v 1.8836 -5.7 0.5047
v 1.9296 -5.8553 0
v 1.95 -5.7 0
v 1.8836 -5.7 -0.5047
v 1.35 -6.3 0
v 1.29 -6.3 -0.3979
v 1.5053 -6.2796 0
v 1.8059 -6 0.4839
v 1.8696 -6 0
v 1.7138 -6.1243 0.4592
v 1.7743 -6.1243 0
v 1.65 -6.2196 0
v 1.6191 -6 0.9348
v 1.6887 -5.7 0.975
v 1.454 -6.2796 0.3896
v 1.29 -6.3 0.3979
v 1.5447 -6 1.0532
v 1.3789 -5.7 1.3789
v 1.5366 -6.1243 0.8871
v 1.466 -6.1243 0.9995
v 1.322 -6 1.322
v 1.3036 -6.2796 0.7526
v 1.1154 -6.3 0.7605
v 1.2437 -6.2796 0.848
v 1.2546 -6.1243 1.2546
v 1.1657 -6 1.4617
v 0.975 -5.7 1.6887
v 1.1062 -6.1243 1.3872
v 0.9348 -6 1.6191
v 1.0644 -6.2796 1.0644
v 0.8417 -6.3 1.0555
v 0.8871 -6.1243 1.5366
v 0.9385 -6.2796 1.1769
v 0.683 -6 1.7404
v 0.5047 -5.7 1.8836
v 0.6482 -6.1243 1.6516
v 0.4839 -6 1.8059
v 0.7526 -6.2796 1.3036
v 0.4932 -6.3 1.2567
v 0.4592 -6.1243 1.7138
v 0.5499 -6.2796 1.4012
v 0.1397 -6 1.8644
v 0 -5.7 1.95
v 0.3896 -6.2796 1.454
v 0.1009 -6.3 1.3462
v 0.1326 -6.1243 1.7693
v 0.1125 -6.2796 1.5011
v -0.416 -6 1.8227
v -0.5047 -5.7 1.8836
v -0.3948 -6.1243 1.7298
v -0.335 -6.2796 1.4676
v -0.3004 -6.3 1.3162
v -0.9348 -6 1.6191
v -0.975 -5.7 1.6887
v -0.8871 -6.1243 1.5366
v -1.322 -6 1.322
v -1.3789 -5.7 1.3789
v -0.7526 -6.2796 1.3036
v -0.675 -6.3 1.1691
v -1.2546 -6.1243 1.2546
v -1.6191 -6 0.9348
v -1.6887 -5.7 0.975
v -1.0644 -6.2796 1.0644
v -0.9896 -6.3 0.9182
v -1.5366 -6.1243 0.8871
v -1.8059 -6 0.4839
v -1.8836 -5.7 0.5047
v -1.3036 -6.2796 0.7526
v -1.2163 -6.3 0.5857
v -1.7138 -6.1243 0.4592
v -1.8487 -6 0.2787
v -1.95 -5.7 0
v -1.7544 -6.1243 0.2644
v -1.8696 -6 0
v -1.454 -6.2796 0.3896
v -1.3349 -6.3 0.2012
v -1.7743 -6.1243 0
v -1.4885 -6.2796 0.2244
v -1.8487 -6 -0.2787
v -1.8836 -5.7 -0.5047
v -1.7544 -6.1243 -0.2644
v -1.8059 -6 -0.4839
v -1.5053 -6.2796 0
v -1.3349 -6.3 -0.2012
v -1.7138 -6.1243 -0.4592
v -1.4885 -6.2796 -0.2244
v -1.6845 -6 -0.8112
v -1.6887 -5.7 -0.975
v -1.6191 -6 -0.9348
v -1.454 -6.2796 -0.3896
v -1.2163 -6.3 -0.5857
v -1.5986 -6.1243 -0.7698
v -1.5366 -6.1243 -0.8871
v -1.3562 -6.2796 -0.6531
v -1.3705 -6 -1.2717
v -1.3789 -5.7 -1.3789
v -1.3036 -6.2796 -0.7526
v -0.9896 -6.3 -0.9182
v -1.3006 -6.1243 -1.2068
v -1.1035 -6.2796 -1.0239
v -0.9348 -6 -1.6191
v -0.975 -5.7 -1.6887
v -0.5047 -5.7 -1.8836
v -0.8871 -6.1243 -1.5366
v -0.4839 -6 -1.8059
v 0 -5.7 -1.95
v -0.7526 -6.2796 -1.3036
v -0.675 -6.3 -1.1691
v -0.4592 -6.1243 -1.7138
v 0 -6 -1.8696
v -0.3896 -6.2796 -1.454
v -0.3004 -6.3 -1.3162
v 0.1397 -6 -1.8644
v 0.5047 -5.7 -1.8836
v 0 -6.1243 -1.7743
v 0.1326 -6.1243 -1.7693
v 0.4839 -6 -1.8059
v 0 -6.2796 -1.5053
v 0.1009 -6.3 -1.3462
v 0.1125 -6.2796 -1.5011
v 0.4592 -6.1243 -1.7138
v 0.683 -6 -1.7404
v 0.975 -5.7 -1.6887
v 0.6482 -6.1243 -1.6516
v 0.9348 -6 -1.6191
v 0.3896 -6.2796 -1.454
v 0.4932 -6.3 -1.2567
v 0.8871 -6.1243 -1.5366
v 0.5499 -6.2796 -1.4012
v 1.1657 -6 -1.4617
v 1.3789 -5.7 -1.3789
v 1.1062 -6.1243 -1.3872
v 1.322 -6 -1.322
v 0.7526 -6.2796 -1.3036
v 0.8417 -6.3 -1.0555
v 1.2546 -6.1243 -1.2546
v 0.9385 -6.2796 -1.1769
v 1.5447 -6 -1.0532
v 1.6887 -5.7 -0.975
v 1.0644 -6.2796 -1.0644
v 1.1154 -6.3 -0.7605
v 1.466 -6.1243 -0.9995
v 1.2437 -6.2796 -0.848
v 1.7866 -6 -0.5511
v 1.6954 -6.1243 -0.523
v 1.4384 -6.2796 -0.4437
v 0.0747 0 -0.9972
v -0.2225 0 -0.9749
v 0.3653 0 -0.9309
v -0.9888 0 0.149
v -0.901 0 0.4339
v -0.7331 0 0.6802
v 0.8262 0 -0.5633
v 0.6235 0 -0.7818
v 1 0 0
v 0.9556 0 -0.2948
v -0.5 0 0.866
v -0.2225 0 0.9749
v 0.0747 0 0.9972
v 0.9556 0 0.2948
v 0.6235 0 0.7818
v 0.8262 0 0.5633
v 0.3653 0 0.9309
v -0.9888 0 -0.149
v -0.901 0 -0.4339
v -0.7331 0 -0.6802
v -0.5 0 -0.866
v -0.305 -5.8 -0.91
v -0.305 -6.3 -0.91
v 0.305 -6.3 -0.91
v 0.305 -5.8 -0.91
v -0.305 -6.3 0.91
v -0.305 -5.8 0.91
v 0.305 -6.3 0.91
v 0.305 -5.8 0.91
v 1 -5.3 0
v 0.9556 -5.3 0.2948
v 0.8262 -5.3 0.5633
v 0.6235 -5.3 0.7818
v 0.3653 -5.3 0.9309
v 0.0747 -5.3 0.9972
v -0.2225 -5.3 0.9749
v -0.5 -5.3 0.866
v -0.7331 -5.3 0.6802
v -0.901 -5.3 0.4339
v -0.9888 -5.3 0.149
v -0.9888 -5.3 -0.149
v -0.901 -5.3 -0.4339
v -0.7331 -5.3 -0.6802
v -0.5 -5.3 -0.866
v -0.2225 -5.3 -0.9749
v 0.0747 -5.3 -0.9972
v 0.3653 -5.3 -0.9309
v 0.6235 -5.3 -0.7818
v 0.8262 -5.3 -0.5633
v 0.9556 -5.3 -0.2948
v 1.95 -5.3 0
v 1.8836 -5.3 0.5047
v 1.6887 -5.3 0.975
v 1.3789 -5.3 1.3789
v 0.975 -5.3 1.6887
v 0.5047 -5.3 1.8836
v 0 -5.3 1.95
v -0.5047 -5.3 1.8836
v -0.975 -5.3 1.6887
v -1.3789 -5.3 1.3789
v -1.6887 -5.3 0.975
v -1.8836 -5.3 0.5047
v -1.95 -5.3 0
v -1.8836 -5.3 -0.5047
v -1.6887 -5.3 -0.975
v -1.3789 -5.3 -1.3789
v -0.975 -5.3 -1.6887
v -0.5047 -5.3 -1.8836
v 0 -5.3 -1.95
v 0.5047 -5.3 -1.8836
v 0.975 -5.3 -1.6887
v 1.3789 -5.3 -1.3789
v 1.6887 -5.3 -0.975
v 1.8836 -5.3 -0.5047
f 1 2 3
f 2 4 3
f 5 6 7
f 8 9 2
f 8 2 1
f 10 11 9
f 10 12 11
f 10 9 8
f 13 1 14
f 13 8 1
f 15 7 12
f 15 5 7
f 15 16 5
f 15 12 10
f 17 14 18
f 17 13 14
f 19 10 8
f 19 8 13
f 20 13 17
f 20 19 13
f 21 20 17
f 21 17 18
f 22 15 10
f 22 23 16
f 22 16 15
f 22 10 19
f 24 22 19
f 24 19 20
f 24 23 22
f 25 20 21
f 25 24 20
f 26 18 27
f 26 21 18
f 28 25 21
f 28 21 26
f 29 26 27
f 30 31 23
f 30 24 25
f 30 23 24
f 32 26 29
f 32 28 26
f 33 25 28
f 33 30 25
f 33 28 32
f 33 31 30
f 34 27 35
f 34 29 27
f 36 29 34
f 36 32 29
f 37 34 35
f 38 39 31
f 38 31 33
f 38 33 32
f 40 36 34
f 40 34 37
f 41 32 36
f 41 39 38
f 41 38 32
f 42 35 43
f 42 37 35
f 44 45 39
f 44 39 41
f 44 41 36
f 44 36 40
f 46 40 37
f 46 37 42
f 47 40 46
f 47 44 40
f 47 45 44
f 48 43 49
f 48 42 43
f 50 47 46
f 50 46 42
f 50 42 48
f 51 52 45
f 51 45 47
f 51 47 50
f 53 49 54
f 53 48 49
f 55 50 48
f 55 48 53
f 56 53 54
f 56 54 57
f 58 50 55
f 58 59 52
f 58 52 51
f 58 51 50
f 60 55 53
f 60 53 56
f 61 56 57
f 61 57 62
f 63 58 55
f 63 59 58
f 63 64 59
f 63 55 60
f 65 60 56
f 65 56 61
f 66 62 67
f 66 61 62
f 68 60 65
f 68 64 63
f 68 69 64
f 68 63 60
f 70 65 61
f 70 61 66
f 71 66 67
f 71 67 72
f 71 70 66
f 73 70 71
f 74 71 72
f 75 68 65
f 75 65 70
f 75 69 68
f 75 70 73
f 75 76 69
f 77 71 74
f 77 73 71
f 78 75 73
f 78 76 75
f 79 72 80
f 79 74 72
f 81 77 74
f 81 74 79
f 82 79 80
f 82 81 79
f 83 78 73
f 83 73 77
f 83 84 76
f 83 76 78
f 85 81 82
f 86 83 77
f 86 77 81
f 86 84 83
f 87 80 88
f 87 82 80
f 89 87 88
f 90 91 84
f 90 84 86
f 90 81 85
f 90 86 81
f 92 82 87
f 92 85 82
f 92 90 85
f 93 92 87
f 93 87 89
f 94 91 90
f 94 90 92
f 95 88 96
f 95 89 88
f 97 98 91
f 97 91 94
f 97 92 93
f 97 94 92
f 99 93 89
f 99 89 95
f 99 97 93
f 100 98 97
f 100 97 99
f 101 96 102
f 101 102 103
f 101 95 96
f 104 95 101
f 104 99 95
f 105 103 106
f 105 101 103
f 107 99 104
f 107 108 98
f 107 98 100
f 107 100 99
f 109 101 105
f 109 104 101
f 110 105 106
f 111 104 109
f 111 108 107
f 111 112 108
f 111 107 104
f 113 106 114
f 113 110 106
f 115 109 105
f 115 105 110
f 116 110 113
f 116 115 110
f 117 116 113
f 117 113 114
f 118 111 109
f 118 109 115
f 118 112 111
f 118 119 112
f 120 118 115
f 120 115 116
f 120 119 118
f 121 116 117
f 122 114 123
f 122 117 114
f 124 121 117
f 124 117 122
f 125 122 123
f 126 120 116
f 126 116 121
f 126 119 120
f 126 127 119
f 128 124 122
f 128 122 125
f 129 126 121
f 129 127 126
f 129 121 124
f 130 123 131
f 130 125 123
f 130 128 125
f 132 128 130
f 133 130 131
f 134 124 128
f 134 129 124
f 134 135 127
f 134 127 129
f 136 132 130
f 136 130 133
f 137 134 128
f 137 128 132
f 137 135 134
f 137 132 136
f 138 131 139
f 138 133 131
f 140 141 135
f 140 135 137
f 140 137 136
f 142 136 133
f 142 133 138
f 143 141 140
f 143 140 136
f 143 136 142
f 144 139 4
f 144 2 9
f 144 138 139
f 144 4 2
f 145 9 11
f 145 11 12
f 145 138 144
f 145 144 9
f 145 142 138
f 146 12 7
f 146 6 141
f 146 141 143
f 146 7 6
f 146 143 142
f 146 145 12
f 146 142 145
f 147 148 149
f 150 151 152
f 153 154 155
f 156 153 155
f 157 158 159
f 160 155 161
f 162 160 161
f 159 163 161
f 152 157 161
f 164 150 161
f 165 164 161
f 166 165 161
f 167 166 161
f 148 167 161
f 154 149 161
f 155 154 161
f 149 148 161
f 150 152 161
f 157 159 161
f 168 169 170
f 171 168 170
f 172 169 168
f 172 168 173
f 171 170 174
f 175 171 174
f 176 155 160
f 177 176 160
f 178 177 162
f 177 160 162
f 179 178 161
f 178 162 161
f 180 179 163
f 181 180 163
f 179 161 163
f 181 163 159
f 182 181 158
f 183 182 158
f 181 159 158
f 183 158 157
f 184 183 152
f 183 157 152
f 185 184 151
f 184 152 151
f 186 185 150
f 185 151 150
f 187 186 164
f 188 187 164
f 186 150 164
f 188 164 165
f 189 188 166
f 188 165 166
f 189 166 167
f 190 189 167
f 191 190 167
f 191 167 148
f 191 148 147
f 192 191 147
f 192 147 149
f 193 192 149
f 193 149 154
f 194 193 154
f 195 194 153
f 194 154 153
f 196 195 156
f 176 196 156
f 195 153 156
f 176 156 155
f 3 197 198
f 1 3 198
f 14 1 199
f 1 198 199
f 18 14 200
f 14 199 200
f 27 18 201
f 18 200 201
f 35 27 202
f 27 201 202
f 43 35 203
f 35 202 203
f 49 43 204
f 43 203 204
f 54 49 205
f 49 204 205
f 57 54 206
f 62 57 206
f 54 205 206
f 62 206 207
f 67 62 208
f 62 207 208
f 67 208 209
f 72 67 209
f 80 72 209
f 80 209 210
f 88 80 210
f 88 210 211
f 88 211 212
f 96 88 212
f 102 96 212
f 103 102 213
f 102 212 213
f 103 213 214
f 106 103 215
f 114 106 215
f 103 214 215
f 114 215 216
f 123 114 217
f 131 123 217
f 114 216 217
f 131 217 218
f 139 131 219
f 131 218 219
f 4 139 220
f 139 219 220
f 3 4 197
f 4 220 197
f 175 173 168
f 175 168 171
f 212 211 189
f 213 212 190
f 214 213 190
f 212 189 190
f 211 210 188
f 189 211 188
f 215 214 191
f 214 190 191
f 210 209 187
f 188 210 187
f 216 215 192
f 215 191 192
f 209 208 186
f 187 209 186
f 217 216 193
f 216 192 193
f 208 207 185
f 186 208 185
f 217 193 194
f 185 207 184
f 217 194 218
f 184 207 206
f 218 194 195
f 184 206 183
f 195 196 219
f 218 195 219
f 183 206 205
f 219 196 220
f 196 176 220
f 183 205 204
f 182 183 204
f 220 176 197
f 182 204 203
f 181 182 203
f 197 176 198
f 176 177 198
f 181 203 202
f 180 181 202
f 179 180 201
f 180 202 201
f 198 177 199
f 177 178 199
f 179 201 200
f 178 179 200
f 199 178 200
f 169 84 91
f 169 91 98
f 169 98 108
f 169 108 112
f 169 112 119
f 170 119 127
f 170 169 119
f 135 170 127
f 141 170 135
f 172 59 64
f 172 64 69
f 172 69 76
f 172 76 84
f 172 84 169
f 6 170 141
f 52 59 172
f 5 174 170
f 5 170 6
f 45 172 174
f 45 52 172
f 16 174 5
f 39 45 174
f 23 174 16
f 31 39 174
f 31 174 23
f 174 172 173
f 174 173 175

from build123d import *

# Parameters (mm, degrees)
F0_R     = 1
F1_DEPTH = 5.3
F3_R     = 1.95
F4_DEPTH = 1
F6_W     = 0.61
F6_H     = 1.82
F7_DEPTH = 0.5
F8_R     = 0.6


with BuildPart() as f1:
    # F0 (on Front) → F1 (new body)
    with BuildSketch(Plane.XZ):
        Circle(F0_R)
    extrude(amount=F1_DEPTH)

    # F3 (on offset) → F4 (join)
    with BuildSketch(Plane.XZ.offset(5.3)):
        Circle(F3_R)
    extrude(amount=F4_DEPTH)

    # F6 (on offset) → F7 (cut)
    with BuildSketch(Plane.XZ.offset(6.3)):
        Rectangle(F6_W, F6_H)
    extrude(amount=-F7_DEPTH, mode=Mode.SUBTRACT)

    # F8
    f8_edges = [f1.edges().sort_by_distance(p)[0] for p in [
        (-1.95, -6.3, 0),
    ]]
    fillet(f8_edges, radius=F8_R)


solid = f1.part
